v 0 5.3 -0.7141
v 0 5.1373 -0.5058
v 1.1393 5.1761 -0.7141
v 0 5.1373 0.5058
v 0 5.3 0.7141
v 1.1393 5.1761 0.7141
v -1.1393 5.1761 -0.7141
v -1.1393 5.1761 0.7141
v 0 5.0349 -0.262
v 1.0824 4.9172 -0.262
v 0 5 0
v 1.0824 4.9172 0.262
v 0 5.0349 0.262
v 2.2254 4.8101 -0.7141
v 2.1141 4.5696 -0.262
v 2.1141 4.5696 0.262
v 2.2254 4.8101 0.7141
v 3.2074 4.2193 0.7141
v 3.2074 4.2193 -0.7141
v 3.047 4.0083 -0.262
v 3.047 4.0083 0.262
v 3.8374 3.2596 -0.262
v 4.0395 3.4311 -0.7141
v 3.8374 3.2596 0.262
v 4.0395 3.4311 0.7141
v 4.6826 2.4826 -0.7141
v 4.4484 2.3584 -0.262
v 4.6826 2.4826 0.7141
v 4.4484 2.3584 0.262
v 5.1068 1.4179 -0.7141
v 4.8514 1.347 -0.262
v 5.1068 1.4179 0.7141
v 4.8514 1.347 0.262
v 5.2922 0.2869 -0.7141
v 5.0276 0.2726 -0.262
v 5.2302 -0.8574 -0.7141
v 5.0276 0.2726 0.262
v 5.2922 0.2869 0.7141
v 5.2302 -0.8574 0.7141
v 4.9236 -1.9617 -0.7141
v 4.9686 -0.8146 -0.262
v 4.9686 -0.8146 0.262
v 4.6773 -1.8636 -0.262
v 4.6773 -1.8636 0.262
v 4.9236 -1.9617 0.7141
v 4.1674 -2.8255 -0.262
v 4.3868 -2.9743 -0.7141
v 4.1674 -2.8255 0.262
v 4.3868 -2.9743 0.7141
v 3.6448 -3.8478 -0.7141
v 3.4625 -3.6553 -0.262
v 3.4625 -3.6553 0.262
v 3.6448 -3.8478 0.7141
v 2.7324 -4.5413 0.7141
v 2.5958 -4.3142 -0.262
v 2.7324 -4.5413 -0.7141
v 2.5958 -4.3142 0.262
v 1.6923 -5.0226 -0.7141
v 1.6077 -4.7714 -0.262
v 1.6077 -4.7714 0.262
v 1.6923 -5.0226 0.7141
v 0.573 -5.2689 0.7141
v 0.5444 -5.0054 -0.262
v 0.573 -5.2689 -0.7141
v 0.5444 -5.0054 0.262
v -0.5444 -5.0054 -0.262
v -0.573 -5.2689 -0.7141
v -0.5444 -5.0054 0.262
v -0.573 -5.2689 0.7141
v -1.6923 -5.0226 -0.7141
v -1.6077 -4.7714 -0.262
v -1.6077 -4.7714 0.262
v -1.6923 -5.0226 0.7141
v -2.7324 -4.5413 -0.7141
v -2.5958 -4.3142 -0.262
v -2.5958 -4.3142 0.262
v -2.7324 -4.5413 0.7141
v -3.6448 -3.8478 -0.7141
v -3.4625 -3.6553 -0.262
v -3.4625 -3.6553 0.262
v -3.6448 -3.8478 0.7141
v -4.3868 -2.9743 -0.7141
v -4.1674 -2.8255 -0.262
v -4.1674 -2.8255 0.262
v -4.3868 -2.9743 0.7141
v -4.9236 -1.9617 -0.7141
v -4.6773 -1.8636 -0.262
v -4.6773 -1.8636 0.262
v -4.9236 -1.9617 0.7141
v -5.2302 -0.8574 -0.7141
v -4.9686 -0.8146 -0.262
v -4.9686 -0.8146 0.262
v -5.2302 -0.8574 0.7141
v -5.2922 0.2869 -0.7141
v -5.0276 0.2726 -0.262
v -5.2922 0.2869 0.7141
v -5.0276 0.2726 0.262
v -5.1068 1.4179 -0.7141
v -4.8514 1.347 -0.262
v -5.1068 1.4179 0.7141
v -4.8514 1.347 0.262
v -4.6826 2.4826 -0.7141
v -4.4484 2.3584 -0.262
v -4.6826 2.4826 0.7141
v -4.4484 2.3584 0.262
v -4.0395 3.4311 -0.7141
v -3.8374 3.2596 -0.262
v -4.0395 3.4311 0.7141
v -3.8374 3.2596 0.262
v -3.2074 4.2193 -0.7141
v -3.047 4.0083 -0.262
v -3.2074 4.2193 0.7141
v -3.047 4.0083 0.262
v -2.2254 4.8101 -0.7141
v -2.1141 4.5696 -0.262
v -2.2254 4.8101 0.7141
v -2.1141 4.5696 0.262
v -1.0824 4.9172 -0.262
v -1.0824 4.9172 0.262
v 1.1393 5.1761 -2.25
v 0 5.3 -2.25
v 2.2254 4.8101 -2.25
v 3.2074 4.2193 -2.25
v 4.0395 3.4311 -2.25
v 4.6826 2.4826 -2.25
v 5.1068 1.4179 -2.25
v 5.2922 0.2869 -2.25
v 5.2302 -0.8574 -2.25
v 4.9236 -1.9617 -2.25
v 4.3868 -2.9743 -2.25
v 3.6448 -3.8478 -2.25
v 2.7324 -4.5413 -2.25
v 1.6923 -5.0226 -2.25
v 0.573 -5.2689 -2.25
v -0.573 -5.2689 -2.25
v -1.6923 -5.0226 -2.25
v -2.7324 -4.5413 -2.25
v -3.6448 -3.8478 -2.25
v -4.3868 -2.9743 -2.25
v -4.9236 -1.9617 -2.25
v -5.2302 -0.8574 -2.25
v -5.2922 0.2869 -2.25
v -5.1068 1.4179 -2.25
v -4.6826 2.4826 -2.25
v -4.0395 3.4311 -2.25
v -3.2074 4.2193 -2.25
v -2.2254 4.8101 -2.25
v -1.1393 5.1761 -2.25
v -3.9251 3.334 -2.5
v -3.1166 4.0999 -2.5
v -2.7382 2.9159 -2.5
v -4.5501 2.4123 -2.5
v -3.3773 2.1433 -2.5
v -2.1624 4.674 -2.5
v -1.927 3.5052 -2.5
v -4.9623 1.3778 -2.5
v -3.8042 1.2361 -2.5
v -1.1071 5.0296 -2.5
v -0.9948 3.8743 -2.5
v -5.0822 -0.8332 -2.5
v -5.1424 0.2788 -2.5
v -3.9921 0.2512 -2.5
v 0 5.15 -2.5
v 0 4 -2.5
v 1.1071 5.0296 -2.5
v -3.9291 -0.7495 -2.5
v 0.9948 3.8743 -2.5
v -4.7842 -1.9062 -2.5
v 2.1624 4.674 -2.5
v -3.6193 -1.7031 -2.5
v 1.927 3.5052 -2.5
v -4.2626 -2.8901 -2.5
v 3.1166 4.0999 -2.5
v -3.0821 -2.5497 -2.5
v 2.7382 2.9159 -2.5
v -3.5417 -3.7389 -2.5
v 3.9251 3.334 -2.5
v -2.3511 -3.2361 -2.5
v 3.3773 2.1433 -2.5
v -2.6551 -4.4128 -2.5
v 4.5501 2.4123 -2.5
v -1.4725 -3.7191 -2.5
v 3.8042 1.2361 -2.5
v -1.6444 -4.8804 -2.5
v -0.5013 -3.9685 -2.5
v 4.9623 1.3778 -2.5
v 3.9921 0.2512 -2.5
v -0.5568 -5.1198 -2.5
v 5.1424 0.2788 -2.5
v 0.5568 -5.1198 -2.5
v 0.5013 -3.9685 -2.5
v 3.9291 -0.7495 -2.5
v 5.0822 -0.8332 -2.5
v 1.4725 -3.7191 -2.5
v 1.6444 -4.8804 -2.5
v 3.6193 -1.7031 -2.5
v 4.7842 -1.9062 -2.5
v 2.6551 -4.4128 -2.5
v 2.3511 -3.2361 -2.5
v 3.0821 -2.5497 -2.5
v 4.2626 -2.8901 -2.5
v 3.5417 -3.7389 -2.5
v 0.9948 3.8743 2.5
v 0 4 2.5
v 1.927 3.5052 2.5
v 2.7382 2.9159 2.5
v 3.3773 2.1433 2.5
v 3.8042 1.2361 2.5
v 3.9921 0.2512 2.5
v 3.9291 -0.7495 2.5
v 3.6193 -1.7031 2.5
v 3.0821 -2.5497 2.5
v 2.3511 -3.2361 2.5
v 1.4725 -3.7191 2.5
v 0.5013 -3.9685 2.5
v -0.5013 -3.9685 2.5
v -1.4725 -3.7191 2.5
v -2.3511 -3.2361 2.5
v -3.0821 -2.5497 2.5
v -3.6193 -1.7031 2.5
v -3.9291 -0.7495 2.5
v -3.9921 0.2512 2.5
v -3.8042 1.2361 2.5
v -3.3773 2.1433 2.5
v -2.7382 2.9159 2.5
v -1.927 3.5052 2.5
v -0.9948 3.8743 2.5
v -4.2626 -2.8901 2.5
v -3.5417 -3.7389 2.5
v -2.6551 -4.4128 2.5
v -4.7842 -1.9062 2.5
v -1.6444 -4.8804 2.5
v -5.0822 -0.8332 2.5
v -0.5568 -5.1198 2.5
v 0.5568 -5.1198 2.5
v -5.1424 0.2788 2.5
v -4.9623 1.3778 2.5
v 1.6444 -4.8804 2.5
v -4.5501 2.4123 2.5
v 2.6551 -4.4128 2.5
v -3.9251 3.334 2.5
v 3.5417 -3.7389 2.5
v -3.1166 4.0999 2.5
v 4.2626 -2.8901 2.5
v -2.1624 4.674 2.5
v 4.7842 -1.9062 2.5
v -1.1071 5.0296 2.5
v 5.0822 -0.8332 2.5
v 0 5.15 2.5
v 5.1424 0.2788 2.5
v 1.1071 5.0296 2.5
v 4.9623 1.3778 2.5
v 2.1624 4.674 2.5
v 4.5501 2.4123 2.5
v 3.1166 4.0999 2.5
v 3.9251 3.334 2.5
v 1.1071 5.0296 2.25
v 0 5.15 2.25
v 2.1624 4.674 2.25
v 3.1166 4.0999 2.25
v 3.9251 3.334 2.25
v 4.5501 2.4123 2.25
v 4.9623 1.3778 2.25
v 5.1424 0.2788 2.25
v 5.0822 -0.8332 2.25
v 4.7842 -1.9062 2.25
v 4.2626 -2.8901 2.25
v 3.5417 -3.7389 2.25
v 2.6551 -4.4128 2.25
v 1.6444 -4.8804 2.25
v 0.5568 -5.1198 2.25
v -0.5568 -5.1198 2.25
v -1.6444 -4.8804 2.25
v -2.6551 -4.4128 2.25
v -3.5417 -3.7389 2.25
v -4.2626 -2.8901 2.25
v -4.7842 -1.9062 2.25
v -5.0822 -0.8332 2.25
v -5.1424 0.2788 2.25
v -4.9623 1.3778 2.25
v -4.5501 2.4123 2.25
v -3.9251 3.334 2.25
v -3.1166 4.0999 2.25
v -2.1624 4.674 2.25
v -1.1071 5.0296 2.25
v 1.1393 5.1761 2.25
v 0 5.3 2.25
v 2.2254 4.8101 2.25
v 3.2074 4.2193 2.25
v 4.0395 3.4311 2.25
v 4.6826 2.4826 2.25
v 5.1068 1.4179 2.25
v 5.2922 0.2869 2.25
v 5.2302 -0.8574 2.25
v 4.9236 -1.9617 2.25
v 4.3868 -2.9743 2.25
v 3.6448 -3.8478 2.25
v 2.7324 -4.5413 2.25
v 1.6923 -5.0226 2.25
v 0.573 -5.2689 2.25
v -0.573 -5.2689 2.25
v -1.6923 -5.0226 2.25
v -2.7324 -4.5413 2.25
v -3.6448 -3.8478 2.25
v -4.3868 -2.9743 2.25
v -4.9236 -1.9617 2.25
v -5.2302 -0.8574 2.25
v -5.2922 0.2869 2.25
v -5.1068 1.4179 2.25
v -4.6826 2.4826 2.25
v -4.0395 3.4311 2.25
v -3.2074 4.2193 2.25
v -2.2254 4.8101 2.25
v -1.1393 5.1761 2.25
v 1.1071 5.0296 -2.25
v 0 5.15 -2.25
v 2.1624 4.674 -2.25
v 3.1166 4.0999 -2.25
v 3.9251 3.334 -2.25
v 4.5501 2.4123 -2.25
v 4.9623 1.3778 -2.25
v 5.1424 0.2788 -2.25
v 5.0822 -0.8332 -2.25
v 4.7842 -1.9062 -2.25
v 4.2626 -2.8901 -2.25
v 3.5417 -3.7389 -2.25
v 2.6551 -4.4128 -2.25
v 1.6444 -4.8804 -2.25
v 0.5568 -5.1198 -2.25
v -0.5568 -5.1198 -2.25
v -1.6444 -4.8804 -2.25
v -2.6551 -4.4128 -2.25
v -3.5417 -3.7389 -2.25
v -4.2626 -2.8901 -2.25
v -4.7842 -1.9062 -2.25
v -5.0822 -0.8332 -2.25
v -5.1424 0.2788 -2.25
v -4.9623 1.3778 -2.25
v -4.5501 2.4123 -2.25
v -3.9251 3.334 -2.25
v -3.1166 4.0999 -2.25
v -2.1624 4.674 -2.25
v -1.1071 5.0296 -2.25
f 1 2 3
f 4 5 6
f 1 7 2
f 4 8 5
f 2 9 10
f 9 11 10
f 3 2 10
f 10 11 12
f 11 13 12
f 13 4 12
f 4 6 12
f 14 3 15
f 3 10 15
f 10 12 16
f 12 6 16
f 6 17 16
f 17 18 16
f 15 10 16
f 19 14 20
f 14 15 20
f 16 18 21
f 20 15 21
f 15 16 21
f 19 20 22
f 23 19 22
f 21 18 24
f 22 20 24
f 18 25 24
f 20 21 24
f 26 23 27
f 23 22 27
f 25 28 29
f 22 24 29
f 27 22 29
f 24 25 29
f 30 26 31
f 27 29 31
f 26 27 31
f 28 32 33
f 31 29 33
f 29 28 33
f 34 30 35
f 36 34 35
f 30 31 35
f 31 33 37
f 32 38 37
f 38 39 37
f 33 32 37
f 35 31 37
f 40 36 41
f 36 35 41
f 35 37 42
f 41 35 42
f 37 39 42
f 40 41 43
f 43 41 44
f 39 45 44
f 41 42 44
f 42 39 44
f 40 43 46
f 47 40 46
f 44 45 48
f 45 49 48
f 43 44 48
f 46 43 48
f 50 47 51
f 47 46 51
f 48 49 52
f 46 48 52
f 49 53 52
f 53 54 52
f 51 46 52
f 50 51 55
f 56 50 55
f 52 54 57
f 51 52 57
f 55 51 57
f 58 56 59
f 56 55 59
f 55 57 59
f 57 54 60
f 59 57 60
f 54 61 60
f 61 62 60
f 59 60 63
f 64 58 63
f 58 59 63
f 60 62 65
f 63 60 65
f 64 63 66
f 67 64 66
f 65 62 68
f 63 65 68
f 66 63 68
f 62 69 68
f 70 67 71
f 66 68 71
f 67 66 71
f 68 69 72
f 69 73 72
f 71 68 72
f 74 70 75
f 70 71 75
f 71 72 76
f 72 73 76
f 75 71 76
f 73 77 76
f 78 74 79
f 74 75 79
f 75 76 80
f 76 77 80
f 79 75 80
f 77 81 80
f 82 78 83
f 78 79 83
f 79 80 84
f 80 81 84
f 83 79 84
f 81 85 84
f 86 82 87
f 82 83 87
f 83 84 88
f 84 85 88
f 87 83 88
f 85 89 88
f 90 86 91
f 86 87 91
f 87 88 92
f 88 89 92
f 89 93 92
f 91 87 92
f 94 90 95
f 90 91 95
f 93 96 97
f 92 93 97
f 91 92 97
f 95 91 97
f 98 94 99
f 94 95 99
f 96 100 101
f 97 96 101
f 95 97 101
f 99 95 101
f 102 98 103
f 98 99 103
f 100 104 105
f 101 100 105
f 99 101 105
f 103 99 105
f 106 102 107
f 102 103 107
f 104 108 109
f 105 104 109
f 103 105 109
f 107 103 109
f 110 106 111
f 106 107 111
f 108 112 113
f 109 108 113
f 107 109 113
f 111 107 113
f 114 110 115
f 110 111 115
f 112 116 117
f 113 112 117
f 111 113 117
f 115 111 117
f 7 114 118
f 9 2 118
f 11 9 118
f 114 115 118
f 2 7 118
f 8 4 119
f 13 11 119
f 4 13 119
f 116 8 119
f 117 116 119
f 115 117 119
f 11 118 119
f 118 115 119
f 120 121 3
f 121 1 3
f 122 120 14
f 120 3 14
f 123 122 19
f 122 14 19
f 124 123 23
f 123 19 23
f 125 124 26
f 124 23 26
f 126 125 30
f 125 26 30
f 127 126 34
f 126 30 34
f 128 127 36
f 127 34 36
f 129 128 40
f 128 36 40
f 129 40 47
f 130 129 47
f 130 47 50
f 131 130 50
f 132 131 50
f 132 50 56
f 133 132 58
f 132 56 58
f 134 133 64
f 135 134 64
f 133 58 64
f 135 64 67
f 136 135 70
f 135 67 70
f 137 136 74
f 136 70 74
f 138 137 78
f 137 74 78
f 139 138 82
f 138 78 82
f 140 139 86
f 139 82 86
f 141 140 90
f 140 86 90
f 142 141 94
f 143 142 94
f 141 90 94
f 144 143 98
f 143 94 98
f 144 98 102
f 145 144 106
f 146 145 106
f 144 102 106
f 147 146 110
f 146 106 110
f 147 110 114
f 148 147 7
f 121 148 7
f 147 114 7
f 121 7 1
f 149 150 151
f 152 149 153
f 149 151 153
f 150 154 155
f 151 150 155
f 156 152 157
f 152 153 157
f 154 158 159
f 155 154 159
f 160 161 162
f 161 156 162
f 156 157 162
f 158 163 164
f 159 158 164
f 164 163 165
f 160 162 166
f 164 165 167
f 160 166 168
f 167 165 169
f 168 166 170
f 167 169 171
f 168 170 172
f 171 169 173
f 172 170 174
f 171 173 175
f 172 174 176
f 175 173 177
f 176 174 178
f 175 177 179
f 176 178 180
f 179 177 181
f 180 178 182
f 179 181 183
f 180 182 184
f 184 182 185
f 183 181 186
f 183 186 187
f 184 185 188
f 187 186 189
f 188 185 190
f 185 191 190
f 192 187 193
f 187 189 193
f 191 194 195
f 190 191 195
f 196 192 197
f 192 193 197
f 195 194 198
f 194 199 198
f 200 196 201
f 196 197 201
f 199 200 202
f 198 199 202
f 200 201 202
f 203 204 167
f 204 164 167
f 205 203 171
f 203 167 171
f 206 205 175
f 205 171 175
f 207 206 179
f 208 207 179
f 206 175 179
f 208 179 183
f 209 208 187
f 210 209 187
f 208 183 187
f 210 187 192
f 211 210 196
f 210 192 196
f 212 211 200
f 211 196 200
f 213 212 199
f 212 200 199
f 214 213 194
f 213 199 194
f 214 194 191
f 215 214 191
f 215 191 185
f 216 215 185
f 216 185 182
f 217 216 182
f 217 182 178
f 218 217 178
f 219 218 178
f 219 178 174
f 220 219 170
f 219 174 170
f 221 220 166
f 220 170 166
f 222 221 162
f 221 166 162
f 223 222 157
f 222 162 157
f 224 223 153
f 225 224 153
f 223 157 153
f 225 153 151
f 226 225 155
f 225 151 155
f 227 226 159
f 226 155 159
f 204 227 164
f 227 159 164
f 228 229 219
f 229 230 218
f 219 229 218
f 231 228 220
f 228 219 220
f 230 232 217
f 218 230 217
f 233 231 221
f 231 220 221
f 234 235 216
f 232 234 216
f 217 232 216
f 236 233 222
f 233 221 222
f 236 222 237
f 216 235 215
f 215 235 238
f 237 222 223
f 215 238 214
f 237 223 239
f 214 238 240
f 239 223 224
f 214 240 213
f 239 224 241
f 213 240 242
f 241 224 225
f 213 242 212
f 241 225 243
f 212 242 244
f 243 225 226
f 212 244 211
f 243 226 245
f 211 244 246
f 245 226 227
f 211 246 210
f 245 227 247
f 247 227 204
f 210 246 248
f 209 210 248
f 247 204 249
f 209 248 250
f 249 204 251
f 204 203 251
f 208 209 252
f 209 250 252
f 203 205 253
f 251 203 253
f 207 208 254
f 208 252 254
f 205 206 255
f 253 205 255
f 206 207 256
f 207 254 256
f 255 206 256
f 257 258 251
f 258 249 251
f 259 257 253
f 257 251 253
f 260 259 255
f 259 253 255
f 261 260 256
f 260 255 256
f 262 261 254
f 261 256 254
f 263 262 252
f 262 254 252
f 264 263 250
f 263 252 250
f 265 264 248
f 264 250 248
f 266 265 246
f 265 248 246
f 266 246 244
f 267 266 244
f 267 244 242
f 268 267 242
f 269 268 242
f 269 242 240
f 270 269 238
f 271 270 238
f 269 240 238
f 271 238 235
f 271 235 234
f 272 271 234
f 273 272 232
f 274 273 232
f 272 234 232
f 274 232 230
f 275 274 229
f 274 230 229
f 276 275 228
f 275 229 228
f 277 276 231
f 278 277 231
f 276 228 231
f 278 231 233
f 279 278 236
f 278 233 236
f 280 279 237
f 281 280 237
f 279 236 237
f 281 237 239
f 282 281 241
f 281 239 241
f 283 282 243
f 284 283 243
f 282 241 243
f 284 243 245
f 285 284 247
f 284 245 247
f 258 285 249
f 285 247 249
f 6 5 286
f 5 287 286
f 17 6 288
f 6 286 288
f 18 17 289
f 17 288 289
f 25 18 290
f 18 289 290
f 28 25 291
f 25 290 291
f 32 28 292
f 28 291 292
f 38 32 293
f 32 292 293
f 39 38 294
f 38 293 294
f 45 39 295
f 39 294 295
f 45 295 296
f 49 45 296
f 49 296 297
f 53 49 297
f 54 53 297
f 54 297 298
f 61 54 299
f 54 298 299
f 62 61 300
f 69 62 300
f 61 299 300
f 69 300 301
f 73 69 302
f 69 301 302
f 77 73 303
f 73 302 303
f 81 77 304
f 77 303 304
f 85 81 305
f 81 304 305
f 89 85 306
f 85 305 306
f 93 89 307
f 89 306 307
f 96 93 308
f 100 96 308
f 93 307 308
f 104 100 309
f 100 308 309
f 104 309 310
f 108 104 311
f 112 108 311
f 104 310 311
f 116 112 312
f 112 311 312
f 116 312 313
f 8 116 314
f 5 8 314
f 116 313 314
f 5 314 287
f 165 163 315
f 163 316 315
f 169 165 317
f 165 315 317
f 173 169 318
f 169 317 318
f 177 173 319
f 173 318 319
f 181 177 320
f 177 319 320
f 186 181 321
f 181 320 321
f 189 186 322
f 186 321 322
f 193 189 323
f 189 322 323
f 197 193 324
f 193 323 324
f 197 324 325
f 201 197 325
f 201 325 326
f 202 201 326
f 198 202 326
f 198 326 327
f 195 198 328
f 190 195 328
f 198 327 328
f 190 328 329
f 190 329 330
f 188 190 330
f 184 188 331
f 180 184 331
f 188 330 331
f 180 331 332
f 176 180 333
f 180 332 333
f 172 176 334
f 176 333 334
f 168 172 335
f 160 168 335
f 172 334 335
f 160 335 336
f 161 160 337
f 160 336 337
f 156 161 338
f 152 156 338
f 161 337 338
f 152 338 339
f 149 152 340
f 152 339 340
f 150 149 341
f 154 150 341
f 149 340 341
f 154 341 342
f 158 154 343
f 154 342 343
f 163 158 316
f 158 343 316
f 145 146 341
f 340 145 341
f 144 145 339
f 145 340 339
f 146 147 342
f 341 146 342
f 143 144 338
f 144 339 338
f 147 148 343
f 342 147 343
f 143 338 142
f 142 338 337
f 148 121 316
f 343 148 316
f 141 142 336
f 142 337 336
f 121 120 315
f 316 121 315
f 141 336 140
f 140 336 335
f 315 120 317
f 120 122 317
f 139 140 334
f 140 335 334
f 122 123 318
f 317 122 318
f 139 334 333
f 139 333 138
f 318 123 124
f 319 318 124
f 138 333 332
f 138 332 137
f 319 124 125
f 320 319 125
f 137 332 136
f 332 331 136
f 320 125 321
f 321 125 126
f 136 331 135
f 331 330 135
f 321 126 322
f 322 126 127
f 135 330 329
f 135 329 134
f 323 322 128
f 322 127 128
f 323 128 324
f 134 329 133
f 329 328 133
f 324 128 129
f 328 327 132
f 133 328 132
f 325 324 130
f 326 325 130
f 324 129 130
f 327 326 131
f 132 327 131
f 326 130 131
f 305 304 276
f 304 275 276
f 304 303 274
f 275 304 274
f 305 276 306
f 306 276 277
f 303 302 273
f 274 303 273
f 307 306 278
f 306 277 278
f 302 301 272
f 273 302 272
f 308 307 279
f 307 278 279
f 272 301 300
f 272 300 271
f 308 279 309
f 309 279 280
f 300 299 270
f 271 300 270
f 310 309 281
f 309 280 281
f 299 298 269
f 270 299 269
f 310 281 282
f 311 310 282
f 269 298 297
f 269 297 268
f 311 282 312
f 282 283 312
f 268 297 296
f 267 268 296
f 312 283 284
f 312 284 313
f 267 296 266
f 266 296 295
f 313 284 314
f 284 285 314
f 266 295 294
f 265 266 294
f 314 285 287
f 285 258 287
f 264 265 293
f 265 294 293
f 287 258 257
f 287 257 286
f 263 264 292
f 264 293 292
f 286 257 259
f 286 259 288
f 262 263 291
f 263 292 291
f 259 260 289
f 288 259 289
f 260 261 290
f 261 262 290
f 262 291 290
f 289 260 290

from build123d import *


with BuildPart() as part:
    # Sketch1 → Revolve1 (revolve)
    with BuildSketch(Plane(origin=(0, 0, 0), x_dir=(0, 0, -1), z_dir=(1, 0, 0))):
        with BuildLine():
            Line((-2.5, 5.15), (-2.5, 4))
            Line((-2.5, 4), (2.5, 4))
            Line((2.5, 4), (2.5, 5.15))
            Line((2.5, 5.15), (2.25, 5.15))
            Line((2.25, 5.15), (2.25, 5.3))
            Line((2.25, 5.3), (0.714142843, 5.3))
            ThreePointArc((0.714142843, 5.3), (0, 5), (-0.714142843, 5.3))
            Line((-0.714142843, 5.3), (-2.25, 5.3))
            Line((-2.25, 5.3), (-2.25, 5.15))
            Line((-2.25, 5.15), (-2.5, 5.15))
        make_face()
    revolve(axis=Axis((0, 0, 6.755399071), (0, 0, -1)))


solid = part.part
